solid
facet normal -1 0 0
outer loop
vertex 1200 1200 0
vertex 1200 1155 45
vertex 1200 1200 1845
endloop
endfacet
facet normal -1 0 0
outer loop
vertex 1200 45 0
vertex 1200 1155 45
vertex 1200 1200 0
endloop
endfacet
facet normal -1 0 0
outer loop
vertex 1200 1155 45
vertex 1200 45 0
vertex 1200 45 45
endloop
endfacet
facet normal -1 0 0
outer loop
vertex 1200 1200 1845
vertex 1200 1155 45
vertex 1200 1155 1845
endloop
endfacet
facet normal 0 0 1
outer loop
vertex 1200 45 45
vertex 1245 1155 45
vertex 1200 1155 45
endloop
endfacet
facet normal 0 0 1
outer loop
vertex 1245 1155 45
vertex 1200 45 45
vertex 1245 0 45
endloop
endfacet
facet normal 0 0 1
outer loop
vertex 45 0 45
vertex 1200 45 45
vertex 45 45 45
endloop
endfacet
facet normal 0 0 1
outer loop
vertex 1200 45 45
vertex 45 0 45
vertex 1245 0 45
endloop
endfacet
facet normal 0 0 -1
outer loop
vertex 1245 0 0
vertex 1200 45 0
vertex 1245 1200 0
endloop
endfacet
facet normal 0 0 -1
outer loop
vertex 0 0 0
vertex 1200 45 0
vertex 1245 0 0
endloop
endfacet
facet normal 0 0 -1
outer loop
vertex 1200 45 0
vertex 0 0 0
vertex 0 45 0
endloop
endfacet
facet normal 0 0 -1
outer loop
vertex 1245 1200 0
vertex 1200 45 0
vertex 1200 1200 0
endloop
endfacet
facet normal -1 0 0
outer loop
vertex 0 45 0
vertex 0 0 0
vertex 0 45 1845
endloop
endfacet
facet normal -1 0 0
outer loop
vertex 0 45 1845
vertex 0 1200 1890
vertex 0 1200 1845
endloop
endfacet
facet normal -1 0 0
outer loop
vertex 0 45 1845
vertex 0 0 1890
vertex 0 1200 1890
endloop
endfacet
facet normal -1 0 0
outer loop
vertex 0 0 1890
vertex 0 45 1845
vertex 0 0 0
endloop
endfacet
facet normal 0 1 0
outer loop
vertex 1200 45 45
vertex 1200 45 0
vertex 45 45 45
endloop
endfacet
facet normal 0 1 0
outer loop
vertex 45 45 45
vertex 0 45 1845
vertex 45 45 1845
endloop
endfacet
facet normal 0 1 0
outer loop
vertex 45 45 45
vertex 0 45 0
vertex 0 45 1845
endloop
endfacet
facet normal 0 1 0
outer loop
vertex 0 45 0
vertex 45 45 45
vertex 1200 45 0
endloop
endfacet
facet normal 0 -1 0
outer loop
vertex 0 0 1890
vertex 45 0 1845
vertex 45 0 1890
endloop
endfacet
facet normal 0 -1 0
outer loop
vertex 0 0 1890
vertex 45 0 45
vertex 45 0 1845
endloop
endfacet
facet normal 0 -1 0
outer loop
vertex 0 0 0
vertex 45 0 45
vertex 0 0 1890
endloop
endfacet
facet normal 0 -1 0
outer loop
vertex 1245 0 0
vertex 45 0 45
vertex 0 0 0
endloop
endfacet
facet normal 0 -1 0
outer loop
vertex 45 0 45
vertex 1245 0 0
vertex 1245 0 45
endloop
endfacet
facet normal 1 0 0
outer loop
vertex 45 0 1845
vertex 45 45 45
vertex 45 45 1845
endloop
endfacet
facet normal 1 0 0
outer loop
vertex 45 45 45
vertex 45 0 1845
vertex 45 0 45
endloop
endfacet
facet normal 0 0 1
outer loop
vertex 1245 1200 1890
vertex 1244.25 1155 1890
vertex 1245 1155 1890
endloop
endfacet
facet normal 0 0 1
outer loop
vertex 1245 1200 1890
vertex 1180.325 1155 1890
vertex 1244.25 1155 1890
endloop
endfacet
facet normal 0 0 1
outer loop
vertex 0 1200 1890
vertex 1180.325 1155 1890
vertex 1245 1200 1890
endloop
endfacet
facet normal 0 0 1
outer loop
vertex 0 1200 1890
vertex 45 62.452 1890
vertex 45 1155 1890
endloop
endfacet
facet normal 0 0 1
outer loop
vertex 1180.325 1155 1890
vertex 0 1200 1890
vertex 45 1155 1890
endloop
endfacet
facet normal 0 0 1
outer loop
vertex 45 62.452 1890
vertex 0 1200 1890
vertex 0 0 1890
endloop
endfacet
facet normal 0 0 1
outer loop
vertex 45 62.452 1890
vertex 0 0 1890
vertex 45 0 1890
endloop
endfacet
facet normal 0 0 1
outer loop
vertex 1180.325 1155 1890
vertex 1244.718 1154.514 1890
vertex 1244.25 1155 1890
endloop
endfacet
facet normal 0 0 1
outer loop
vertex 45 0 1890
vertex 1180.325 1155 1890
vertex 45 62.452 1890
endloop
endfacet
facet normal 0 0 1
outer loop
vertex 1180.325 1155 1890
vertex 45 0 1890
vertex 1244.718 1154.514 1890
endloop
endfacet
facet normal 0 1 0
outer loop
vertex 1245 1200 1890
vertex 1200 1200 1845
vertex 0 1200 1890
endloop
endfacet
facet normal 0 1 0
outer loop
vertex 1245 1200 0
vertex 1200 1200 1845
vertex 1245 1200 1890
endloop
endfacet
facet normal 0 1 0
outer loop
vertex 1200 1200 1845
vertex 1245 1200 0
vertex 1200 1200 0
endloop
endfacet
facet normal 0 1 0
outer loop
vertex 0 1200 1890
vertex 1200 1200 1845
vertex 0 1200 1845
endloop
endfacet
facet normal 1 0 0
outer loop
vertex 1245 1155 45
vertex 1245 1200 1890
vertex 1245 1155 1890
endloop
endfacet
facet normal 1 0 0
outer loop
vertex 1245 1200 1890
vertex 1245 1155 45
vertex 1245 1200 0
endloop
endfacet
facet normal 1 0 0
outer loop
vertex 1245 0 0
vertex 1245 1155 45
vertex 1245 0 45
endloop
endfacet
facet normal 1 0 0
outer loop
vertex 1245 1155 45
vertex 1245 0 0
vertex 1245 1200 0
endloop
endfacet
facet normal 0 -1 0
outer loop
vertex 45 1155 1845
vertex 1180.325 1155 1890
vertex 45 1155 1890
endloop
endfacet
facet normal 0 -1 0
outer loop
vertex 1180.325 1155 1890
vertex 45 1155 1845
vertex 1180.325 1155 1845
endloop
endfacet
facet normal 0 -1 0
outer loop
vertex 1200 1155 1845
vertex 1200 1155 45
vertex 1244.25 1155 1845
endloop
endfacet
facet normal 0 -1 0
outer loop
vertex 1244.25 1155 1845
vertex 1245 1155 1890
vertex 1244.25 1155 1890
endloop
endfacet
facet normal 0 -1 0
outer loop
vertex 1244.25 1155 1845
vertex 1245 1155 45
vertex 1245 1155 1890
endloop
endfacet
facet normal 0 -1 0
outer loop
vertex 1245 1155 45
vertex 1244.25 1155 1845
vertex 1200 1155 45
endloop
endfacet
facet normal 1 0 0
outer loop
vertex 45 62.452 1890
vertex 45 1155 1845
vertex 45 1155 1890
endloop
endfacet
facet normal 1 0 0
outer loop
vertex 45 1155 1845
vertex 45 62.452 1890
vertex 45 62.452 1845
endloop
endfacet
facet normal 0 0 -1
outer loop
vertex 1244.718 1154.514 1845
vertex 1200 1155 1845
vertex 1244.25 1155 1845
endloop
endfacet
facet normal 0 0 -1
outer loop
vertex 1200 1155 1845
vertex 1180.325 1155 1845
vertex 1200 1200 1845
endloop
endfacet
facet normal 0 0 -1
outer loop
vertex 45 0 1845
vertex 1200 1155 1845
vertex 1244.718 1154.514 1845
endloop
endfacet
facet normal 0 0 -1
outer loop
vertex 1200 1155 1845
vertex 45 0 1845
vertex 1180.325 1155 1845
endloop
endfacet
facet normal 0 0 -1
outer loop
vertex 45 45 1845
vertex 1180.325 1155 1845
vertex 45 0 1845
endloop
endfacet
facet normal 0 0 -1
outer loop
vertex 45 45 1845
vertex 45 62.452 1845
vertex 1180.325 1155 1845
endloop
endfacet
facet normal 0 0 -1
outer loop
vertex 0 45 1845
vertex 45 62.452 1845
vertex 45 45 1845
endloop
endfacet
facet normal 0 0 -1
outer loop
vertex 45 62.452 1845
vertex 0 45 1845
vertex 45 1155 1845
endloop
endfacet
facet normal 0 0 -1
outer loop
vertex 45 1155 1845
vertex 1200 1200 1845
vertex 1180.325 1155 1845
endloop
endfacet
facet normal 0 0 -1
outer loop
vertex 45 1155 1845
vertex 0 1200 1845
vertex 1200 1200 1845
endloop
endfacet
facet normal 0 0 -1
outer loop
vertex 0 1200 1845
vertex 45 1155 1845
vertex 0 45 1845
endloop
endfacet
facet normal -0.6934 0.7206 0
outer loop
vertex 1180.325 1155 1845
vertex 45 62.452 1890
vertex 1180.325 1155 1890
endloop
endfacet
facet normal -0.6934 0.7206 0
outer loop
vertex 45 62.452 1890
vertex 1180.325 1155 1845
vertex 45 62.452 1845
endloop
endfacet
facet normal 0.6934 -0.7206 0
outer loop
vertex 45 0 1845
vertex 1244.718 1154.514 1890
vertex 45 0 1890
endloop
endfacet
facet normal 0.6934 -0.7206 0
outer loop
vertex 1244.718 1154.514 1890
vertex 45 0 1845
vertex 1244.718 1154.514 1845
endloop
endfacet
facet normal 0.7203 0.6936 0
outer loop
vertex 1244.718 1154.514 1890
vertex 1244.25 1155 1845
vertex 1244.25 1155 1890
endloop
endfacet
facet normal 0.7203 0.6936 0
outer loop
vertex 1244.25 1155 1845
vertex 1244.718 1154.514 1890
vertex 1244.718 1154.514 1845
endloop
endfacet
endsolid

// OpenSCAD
module face(){
cube(size=[1200,45,45],center=false);
cube(size=[45,45,1890],center=false);
}
module haut(){
translate([0,0,1890]){
rotate([-90,0,0])
cube(size=[45,45,1200],center=false);}
}
module haut2(){
translate([0,45,1845]){
rotate([90,0,0])
cube(size=[45,45,1200],center=false);}
}
module transversale(){
translate([45,0,1845]){
rotate([0,0,43.9])
cube(size=[1665,45,45],center=false);    
}}
module cellule(){
face();
haut();
translate([1200,1200,0]){
rotate([0,0,-90]){
face();
haut2();}}
transversale();}

cellule();
